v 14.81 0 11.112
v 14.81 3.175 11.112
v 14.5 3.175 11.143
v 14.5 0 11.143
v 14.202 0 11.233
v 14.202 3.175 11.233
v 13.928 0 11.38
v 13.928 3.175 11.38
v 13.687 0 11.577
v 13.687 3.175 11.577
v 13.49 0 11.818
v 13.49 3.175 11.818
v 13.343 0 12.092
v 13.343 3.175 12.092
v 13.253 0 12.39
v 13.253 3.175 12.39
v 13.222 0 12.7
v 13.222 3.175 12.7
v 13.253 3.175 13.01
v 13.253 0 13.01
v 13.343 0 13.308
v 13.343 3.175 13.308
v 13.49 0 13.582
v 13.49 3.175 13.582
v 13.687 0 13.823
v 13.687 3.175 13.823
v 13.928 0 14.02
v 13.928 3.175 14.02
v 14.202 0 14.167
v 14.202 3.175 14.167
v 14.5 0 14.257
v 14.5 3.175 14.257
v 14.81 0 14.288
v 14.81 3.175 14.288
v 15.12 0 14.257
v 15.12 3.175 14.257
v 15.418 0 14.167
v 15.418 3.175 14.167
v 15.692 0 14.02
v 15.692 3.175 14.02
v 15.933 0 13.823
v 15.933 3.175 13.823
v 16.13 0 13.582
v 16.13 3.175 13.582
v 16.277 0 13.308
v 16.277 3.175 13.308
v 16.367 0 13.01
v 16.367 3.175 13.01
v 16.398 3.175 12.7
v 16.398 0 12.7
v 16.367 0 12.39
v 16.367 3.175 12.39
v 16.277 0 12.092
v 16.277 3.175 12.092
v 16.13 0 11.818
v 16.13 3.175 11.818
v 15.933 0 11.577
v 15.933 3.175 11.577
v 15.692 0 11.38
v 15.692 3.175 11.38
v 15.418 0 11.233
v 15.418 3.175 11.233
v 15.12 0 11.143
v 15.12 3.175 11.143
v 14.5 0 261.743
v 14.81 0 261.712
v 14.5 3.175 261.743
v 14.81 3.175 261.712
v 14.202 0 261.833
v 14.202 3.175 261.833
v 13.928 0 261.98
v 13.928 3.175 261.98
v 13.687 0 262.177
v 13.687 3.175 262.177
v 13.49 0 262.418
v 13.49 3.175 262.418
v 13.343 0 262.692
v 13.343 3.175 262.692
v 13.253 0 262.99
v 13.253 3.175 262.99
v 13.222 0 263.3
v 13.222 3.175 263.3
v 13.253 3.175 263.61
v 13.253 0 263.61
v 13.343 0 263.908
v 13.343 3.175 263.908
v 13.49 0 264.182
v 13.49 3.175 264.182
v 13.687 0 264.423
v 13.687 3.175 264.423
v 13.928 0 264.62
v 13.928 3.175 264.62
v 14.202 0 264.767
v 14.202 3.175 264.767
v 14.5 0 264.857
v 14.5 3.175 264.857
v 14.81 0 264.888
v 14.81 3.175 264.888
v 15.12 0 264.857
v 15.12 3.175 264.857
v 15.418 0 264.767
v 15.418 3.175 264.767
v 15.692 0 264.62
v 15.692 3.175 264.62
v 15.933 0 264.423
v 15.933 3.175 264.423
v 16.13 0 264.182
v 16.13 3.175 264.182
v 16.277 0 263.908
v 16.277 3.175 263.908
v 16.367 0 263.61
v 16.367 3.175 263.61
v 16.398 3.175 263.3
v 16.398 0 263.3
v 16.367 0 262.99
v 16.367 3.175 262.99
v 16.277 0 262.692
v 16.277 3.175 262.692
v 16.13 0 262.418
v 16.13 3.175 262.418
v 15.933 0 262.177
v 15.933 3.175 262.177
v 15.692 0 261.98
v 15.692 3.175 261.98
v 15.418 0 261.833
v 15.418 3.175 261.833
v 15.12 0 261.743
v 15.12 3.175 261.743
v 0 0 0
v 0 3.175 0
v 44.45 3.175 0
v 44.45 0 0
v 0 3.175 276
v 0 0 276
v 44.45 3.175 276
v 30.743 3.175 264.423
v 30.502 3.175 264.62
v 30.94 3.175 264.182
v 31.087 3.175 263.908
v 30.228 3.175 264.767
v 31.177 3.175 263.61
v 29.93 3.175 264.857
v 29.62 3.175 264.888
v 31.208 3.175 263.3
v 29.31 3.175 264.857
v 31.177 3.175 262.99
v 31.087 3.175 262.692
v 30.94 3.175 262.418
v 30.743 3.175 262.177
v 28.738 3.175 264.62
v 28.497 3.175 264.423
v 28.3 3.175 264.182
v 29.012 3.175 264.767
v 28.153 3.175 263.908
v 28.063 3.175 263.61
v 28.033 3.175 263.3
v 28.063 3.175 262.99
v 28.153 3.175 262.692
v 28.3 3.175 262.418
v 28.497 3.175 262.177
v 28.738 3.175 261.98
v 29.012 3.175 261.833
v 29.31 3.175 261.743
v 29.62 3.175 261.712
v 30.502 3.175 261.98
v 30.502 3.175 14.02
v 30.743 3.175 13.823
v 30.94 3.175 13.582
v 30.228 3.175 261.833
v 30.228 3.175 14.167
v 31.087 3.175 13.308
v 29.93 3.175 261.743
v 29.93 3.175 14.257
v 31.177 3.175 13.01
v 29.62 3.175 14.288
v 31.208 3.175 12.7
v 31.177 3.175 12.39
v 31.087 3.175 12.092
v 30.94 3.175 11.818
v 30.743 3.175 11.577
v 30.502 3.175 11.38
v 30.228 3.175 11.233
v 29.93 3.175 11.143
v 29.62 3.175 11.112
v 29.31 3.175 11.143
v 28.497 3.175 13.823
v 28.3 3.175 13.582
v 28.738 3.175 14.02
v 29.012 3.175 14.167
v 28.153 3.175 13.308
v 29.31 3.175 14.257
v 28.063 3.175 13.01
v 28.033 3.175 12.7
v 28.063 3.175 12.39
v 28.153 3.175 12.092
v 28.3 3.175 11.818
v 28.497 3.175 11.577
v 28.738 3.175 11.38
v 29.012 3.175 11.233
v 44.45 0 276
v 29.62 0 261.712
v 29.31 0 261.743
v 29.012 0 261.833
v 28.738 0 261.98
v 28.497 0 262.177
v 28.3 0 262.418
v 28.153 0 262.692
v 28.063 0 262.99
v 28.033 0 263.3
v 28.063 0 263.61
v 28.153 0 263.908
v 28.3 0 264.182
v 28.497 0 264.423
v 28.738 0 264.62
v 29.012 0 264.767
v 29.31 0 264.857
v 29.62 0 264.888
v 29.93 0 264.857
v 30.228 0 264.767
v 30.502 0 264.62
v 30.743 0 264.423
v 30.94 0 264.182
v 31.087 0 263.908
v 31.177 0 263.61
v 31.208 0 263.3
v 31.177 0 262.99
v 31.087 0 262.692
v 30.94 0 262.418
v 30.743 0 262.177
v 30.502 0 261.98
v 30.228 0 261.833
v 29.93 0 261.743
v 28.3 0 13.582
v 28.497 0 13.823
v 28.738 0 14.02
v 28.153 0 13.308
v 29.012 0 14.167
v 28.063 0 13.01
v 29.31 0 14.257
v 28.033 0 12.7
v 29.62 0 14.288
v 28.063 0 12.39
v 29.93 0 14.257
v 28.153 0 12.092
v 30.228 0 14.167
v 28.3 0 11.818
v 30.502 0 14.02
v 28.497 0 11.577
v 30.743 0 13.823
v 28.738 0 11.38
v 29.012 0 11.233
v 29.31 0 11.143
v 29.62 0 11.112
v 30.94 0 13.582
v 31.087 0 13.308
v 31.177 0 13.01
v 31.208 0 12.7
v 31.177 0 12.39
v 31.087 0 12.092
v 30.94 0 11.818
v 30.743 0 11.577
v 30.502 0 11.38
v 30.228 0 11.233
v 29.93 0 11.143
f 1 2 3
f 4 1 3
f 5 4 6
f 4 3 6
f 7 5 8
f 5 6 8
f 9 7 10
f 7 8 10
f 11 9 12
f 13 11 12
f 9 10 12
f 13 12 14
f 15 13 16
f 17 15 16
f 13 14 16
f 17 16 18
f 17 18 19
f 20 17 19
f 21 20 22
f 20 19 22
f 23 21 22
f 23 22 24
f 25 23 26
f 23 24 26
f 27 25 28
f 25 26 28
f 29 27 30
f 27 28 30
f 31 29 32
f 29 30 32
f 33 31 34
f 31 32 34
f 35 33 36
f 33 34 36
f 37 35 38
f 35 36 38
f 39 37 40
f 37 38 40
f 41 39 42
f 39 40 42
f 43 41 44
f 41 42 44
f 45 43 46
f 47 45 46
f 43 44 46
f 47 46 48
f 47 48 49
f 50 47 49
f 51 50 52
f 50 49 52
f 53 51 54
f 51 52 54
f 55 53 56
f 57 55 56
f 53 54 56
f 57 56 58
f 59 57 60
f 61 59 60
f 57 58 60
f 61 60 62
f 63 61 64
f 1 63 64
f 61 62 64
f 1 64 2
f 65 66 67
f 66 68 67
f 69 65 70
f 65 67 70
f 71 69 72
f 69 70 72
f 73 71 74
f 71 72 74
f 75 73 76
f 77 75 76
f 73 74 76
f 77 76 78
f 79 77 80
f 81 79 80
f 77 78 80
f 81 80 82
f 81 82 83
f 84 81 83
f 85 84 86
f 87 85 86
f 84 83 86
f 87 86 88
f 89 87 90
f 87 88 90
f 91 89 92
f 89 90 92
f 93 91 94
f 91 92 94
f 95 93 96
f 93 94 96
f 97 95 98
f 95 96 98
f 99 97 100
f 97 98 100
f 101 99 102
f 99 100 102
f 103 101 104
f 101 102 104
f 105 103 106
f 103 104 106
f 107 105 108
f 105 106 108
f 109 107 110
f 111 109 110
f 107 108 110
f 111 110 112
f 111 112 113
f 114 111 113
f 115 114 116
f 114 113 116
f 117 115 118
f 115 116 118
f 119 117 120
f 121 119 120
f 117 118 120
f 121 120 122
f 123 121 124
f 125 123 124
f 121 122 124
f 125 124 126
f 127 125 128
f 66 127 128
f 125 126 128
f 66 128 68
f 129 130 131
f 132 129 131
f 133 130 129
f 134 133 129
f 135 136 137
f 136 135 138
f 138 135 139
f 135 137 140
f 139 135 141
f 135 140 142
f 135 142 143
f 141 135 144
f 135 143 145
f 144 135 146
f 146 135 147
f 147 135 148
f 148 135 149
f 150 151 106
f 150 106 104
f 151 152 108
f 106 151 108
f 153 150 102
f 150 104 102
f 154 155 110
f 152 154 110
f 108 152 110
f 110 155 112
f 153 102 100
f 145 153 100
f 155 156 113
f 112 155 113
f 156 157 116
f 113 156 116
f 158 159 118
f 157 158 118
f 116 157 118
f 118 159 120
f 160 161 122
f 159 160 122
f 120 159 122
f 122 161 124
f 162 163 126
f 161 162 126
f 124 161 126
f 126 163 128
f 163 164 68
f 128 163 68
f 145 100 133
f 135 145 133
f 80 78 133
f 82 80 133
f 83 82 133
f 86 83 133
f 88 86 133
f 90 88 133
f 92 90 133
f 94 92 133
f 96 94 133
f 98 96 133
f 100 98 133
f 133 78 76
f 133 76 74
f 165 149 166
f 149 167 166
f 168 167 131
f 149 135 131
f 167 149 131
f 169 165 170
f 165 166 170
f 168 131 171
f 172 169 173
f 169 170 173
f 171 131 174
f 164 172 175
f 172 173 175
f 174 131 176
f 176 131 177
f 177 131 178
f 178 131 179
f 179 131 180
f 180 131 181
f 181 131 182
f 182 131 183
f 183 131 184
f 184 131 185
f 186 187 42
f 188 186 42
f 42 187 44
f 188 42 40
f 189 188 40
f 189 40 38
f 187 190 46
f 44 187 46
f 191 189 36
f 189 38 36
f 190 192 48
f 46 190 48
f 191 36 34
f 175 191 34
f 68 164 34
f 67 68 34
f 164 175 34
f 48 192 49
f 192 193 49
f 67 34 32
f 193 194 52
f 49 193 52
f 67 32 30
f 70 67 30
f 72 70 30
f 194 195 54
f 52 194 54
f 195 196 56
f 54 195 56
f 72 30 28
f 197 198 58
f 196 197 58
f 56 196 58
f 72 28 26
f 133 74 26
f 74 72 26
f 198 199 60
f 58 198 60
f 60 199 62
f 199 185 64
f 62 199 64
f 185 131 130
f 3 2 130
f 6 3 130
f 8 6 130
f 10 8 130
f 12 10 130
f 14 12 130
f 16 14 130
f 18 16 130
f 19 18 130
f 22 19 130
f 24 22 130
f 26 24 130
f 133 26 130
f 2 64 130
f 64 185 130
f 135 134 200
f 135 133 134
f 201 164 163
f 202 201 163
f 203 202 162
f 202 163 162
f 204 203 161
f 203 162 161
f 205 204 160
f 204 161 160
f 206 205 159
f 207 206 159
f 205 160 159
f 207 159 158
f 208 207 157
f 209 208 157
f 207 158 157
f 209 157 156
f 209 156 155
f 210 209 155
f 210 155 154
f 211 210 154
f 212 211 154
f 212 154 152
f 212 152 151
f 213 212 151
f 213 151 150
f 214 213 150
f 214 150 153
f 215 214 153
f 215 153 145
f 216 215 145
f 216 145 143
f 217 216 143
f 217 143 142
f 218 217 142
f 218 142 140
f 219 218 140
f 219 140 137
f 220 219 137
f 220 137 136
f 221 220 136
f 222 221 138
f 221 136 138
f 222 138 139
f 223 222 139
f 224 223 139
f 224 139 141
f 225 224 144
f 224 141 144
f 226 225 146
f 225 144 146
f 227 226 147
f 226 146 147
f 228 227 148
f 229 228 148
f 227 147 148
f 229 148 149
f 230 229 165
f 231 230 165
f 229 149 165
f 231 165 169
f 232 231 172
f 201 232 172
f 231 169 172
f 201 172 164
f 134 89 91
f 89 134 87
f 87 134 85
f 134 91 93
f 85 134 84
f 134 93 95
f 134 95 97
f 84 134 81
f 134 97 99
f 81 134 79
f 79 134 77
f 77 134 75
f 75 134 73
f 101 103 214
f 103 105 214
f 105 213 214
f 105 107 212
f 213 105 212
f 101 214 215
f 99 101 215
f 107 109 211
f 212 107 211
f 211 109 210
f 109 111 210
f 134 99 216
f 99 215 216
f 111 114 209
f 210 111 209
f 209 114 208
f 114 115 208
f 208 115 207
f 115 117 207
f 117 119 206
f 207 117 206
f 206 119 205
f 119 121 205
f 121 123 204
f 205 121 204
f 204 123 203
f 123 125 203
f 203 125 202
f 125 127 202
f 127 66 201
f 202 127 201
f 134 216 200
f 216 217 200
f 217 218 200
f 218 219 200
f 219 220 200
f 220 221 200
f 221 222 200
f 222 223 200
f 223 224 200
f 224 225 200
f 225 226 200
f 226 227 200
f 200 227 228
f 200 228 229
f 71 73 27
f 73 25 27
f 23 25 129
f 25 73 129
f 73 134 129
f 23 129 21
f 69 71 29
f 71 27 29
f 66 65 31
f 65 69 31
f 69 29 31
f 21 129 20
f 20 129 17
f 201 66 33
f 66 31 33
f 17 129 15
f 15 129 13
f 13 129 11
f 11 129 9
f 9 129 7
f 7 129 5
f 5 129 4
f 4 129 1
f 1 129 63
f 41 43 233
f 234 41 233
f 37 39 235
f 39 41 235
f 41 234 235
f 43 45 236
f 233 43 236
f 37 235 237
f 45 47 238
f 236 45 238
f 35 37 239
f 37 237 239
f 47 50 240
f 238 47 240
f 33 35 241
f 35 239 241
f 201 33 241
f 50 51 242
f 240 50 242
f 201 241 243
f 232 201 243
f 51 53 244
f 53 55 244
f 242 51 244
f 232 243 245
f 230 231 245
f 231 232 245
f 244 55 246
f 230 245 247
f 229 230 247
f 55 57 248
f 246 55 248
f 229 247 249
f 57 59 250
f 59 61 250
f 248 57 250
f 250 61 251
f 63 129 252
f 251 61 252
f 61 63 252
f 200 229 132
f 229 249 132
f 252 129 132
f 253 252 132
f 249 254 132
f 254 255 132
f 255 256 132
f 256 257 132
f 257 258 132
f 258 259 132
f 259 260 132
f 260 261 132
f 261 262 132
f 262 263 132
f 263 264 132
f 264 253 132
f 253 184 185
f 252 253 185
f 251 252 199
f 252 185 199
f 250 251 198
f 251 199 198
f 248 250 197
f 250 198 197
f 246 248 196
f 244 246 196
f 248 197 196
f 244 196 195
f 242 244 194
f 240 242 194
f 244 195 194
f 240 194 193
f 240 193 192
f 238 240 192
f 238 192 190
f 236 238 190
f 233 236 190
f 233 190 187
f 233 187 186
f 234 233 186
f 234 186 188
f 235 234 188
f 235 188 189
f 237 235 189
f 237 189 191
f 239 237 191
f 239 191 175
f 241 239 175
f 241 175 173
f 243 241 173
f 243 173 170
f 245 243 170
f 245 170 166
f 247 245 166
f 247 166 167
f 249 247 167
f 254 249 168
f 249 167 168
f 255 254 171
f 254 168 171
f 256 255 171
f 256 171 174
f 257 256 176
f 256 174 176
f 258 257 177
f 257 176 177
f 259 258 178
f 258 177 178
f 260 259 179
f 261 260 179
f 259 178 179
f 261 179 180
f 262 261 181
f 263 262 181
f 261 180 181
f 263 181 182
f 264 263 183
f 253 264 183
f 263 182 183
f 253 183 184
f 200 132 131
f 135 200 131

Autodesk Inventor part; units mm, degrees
ref_plane "YZ Plane" through (0, 0, 0) normal (1, 0, 0) x (0, 1, 0)
ref_plane "XZ Plane" through (0, 0, 0) normal (0, 1, 0) x (-1, 0, 0)
ref_plane "XY Plane" through (0, 0, 0) normal (0, 0, 1) x (1, 0, 0)
sketch "Sketch1" plane through (0, 0, 0) normal (0, 0, 1) x (1, 0, 0)
  line L0 (0, 0) -> (44.45, 0)
  line L1 (44.45, 0) -> (44.45, 3.175)
  line L2 (44.45, 3.175) -> (0, 3.175)
  line L3 (0, 3.175) -> (0, 0)
  dimension "d0" = 44.45
  dimension "d1" = 3.175
extrude "Extrusion1" add sketch "Sketch1" along normal blind 276
sketch "Sketch2" plane through (0, 0, 0) normal (0, -1, 0) x (1, 0, 0)
  line L0 (0, 0) -> (44.45, 0) projected
  line L1 (44.45, 0) -> (44.45, 276) projected
  line L2 (0, 276) -> (44.45, 276) projected
  line L3 (0, 0) -> (0, 276) projected
  point P0 (14.81, 263.3)
  point P1 (29.62, 263.3)
  point P2 (14.81, 12.7)
  point P3 (29.62, 12.7)
  dimension "d4" = 12.7
  dimension "d5" = 12.7
  dimension "d6" = 14.81
  dimension "d7" = 14.81
hole "Hole1" at (14.81, 0, 263.3) at (29.62, 0, 263.3) at (14.81, 0, 12.7) at (29.62, 0, 12.7) direction (0, 1, 0) diameter 3.175 depth 8 tip angle 118
properties part number "platen_286mm"
